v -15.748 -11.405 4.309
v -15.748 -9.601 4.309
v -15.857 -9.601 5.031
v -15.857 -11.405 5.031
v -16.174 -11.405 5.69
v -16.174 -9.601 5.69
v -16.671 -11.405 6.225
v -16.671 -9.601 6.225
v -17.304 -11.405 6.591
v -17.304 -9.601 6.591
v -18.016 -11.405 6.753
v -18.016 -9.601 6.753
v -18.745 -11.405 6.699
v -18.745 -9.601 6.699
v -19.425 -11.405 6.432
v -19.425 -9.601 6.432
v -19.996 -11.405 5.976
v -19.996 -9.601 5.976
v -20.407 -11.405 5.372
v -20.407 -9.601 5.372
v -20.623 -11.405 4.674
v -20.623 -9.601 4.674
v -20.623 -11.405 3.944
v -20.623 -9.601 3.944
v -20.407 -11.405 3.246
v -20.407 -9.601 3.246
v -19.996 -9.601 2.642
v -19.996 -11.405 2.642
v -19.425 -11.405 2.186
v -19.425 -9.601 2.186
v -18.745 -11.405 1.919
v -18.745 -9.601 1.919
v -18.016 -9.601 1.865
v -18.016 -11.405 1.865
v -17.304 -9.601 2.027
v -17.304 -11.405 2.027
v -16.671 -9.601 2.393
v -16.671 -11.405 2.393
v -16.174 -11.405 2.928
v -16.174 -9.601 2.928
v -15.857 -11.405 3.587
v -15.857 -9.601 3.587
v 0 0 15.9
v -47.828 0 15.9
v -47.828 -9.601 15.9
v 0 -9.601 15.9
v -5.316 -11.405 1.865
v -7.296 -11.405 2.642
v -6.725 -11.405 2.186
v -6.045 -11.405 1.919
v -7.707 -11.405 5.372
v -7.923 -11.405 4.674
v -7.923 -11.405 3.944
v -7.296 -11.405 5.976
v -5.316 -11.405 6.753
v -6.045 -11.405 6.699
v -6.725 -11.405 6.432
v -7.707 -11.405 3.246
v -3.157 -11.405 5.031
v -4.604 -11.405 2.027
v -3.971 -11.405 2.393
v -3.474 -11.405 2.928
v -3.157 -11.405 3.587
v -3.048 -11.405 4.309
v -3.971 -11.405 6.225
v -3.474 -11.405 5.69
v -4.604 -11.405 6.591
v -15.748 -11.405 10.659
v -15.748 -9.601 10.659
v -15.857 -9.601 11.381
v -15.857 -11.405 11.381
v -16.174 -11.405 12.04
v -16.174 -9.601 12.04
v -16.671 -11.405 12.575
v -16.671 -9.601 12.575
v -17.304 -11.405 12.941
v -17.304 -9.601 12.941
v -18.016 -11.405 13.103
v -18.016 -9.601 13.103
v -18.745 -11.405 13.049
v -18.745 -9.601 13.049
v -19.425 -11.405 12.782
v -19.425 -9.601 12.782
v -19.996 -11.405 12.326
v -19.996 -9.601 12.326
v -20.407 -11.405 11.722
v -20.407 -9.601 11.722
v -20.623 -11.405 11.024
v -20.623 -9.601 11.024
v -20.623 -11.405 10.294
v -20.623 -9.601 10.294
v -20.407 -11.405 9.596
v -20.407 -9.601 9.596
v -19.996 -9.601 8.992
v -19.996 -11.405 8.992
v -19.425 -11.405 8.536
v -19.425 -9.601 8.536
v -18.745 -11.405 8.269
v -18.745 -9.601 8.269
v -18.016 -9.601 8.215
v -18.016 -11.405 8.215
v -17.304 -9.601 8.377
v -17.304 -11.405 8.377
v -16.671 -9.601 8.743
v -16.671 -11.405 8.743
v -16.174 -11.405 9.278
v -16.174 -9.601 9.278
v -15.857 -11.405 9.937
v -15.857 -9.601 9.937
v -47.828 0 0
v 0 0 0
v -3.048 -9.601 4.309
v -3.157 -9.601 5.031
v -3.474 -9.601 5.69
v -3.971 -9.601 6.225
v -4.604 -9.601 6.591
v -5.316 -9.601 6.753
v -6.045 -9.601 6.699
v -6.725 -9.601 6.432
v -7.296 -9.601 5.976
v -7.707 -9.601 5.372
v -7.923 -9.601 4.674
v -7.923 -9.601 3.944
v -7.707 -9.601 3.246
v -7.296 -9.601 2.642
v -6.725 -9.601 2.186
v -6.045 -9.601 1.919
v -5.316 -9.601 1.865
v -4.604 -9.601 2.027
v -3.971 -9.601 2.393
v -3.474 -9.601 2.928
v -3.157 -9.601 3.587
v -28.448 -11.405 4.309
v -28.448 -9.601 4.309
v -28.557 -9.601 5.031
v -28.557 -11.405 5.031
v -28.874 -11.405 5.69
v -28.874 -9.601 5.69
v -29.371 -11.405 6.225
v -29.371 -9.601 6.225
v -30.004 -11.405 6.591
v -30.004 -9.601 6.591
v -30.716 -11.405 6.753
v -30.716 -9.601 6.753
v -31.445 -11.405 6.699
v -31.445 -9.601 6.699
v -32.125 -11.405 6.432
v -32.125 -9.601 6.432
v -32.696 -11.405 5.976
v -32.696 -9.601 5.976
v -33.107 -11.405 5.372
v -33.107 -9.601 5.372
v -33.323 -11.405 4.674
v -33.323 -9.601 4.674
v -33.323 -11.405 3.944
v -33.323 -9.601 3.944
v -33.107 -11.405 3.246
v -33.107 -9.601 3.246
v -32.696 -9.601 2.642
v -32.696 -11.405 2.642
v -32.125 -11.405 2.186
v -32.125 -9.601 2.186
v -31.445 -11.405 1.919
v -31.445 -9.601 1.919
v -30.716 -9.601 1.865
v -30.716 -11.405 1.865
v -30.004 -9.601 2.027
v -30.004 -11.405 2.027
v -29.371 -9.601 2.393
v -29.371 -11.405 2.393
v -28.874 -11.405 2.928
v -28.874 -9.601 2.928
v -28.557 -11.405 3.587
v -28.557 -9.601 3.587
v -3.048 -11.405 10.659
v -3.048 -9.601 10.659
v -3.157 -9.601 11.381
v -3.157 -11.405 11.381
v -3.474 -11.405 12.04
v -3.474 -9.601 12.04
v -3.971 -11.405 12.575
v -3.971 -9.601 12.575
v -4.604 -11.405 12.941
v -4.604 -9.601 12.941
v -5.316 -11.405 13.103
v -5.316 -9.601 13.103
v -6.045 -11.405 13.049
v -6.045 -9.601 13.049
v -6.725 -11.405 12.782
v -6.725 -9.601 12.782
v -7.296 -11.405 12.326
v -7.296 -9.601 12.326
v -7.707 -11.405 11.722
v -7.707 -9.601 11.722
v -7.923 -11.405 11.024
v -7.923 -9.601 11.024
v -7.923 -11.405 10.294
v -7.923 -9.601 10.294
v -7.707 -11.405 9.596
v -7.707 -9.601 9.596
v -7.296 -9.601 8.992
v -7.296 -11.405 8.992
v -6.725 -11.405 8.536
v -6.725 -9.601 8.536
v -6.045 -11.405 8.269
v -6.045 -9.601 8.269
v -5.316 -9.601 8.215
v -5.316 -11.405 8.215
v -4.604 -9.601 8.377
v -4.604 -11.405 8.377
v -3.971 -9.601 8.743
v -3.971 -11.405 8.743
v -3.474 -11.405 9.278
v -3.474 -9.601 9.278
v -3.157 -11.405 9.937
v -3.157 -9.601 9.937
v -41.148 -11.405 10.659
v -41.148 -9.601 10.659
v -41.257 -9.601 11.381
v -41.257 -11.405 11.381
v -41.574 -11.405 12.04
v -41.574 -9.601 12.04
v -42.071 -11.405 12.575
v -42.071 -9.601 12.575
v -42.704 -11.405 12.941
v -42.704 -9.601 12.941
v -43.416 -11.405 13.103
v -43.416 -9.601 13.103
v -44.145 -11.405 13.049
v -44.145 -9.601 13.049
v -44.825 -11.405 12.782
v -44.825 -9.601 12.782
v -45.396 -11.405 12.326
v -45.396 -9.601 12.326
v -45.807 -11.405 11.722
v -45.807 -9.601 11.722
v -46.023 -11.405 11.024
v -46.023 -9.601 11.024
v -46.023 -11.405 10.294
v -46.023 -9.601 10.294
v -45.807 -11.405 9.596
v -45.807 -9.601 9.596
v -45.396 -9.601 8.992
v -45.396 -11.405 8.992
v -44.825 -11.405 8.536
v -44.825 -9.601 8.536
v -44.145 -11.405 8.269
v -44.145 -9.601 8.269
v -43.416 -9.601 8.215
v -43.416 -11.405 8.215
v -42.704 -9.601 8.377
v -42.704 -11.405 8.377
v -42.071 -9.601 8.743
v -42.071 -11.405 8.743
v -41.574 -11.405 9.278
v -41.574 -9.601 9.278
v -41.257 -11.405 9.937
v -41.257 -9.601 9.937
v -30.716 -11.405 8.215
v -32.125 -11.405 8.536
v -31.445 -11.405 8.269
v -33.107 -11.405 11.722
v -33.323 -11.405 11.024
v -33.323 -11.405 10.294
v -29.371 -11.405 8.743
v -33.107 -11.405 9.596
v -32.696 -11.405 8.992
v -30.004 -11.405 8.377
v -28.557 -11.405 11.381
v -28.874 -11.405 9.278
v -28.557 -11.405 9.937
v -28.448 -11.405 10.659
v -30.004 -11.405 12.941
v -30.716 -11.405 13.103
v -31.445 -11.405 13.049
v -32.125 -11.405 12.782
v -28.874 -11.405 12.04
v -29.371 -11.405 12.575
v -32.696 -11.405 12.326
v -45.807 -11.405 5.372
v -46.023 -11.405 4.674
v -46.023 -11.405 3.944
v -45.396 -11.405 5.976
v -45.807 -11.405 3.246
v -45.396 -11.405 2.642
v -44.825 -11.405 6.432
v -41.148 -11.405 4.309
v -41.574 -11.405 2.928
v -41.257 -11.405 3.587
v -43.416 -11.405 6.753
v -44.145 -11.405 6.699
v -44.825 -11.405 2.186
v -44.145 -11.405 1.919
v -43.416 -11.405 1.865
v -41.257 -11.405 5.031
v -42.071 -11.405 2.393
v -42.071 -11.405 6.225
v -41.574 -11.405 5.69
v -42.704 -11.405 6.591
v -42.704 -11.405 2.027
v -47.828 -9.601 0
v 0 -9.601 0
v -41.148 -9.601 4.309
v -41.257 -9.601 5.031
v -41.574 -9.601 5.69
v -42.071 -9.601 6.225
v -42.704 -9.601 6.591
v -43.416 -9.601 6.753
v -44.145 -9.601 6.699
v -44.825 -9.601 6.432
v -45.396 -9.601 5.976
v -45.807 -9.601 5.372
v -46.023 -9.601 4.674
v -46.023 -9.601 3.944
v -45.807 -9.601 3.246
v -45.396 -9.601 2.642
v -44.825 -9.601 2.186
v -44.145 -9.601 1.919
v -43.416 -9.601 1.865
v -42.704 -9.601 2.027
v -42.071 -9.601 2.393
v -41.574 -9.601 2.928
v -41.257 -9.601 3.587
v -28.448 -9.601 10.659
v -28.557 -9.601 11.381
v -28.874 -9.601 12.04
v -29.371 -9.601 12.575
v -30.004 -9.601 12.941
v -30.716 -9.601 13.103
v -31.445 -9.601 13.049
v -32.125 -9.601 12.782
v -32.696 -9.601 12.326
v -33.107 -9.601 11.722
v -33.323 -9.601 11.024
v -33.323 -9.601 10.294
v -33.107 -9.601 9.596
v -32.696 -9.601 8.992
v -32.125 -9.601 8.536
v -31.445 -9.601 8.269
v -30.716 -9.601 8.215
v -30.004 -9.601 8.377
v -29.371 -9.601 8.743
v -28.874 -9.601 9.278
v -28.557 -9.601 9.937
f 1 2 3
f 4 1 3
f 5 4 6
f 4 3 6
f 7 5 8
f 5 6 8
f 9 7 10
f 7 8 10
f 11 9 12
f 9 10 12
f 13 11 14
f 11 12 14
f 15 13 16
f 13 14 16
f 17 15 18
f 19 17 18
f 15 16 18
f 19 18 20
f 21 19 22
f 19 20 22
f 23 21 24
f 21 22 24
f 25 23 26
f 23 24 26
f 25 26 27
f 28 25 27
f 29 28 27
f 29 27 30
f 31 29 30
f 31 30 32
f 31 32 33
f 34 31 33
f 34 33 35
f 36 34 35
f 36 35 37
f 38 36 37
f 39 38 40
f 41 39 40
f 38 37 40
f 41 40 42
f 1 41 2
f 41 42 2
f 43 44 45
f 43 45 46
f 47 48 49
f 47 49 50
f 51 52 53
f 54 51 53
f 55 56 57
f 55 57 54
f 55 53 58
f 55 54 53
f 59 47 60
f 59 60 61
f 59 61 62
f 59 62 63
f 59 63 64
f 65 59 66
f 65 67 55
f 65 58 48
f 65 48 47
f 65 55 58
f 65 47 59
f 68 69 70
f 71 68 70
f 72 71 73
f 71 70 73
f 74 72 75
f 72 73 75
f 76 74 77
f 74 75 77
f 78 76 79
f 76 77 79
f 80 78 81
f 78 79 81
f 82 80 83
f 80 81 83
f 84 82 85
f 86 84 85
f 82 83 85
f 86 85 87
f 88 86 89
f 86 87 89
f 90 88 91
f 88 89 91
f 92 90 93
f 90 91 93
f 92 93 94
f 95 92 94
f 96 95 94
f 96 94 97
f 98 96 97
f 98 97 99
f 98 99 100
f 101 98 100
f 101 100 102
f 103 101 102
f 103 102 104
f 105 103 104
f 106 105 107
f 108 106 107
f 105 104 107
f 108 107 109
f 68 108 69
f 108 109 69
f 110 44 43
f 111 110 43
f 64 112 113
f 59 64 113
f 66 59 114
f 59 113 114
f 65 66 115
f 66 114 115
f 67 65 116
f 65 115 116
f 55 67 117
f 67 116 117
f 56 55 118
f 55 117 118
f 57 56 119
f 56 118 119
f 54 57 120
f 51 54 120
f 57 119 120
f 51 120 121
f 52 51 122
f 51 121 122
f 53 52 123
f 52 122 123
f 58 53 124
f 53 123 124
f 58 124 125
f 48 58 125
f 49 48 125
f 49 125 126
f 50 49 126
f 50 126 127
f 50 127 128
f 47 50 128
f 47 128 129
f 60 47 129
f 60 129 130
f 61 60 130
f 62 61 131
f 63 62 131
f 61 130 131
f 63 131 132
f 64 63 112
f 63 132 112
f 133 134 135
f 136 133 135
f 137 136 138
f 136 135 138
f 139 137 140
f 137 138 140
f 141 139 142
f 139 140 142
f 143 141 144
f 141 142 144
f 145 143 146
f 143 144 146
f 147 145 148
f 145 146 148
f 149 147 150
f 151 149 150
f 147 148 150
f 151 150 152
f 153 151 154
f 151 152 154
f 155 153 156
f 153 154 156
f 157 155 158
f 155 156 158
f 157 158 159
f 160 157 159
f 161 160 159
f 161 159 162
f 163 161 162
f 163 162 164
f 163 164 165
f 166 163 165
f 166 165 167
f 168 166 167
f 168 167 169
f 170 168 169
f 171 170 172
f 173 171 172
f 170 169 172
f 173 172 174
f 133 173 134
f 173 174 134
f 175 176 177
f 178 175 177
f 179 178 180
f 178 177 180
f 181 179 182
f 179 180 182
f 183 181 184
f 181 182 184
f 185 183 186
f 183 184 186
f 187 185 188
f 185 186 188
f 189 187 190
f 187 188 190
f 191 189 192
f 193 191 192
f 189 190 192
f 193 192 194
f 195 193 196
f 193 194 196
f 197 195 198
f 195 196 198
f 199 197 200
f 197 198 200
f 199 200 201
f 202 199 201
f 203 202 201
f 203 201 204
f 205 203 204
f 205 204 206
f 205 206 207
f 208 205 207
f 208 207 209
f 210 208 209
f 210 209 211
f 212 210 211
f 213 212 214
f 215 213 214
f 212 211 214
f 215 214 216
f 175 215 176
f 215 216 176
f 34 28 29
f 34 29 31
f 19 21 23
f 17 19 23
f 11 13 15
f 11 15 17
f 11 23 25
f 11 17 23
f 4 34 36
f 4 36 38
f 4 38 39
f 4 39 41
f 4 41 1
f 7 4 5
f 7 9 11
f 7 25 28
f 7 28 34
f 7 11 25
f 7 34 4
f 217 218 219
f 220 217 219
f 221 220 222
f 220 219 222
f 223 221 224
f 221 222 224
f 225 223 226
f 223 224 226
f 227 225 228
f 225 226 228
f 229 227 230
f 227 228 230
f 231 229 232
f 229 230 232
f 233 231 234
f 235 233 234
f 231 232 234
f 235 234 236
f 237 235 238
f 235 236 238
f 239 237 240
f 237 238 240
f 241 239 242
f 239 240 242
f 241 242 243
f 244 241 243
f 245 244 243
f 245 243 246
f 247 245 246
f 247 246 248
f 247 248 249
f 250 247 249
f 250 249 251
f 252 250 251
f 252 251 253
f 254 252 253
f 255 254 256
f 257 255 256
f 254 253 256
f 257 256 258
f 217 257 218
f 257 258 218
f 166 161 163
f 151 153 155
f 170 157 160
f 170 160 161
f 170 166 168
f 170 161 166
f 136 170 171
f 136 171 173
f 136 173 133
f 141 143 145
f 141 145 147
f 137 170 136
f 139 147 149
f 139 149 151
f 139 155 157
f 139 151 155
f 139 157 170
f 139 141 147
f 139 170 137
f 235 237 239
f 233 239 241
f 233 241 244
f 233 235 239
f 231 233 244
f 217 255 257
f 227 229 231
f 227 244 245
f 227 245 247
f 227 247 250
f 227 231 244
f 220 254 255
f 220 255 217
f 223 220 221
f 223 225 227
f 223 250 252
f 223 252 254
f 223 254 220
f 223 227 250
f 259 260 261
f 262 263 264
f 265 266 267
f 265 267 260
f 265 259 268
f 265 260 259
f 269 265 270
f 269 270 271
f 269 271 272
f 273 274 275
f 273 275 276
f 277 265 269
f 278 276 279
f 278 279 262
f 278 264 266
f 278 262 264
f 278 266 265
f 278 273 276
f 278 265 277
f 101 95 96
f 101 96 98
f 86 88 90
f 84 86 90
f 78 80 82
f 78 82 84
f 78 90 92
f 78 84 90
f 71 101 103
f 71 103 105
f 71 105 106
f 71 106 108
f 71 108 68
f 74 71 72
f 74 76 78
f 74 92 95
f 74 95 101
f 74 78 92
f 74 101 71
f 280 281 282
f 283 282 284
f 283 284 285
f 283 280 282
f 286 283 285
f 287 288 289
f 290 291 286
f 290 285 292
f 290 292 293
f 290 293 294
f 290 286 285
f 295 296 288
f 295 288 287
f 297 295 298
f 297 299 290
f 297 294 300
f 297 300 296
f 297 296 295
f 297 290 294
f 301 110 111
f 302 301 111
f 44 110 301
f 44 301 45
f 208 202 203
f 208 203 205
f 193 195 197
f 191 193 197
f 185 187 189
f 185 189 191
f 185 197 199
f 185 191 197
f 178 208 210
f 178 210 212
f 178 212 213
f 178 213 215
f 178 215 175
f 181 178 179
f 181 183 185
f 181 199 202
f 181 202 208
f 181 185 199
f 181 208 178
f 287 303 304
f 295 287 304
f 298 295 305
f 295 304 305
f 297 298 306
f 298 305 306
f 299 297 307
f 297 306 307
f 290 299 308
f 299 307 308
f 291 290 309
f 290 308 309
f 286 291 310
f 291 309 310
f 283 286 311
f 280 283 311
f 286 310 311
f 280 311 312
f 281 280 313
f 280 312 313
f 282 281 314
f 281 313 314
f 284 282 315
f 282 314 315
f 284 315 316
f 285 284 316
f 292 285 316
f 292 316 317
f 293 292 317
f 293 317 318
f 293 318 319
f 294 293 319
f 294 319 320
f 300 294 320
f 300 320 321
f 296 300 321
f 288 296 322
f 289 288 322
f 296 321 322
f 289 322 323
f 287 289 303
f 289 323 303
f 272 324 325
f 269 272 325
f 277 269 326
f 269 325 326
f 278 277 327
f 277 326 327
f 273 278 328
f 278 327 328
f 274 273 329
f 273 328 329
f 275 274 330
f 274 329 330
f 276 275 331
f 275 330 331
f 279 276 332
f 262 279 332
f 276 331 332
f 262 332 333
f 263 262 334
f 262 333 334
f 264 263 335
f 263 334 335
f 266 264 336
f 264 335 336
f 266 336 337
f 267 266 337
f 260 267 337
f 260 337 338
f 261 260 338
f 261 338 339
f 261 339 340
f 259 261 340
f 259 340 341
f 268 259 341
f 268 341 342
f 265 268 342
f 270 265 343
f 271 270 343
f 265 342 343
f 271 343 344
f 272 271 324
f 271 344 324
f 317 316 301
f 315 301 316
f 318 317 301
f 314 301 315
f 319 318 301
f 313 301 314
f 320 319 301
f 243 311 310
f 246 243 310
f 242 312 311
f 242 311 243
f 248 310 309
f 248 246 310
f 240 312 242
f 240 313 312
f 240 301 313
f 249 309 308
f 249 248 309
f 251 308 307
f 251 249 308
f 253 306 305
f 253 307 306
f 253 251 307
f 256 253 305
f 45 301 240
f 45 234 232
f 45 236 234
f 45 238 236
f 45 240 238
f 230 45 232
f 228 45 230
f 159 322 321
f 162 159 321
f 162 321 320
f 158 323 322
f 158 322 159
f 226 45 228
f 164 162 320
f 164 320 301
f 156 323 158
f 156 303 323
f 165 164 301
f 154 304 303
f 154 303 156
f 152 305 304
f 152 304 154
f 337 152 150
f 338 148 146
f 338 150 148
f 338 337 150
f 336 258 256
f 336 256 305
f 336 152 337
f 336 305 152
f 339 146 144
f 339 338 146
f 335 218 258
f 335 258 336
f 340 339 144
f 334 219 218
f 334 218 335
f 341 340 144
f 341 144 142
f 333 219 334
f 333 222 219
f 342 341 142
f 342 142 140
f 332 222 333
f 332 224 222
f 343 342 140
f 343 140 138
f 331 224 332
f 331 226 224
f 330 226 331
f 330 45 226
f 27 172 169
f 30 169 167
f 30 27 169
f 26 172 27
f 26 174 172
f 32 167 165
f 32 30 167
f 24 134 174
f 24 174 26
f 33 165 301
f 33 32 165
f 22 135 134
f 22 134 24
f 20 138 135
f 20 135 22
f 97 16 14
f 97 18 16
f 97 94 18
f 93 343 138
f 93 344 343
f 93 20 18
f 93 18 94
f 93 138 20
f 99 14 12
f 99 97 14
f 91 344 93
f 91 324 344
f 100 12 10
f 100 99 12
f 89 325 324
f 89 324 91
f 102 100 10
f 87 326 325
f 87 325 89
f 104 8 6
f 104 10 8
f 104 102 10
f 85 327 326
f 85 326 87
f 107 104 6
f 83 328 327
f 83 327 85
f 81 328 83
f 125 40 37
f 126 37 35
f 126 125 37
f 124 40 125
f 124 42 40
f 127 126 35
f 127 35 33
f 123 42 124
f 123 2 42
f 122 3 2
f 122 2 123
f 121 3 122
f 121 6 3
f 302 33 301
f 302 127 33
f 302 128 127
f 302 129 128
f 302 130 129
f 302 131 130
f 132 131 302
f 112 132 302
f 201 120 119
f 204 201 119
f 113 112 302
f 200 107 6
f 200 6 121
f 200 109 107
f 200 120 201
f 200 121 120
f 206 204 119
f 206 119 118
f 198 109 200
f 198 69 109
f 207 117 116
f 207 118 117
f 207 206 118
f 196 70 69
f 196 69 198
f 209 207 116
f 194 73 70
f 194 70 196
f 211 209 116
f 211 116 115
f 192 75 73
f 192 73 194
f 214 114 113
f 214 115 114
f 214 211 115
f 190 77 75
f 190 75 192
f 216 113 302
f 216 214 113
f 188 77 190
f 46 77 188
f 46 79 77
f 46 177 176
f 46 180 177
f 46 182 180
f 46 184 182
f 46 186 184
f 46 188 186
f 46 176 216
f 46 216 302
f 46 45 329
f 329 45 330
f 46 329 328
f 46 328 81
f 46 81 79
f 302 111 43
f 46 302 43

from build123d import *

# Parameters (mm, degrees)
F0_W     = 47.8282
F0_H     = 15.9004
F1_DEPTH = 9.6012
F2_R     = 2.4511
F3_DEPTH = 1.8034


with BuildPart() as f1:
    # F0 (on Front) → F1 (new body)
    with BuildSketch(Plane.XZ):
        with Locations((-23.9141, 7.9502)):
            Rectangle(F0_W, F0_H)
    extrude(amount=F1_DEPTH)

    # F2 (on face) → F3 (join)
    with BuildSketch(Plane.XZ.offset(9.6012)):
        with Locations((-5.4991, 10.659005)):
            Circle(F2_R)
        with Locations((-5.4991, 4.309005)):
            Circle(F2_R)
        with Locations((-18.1991, 10.659005)):
            Circle(F2_R)
        with Locations((-18.1991, 4.309005)):
            Circle(F2_R)
        with Locations((-30.8991, 10.659005)):
            Circle(F2_R)
        with Locations((-30.8991, 4.309005)):
            Circle(F2_R)
        with Locations((-43.5991, 10.659005)):
            Circle(F2_R)
        with Locations((-43.5991, 4.309005)):
            Circle(F2_R)
    extrude(amount=F3_DEPTH)


solid = f1.part
